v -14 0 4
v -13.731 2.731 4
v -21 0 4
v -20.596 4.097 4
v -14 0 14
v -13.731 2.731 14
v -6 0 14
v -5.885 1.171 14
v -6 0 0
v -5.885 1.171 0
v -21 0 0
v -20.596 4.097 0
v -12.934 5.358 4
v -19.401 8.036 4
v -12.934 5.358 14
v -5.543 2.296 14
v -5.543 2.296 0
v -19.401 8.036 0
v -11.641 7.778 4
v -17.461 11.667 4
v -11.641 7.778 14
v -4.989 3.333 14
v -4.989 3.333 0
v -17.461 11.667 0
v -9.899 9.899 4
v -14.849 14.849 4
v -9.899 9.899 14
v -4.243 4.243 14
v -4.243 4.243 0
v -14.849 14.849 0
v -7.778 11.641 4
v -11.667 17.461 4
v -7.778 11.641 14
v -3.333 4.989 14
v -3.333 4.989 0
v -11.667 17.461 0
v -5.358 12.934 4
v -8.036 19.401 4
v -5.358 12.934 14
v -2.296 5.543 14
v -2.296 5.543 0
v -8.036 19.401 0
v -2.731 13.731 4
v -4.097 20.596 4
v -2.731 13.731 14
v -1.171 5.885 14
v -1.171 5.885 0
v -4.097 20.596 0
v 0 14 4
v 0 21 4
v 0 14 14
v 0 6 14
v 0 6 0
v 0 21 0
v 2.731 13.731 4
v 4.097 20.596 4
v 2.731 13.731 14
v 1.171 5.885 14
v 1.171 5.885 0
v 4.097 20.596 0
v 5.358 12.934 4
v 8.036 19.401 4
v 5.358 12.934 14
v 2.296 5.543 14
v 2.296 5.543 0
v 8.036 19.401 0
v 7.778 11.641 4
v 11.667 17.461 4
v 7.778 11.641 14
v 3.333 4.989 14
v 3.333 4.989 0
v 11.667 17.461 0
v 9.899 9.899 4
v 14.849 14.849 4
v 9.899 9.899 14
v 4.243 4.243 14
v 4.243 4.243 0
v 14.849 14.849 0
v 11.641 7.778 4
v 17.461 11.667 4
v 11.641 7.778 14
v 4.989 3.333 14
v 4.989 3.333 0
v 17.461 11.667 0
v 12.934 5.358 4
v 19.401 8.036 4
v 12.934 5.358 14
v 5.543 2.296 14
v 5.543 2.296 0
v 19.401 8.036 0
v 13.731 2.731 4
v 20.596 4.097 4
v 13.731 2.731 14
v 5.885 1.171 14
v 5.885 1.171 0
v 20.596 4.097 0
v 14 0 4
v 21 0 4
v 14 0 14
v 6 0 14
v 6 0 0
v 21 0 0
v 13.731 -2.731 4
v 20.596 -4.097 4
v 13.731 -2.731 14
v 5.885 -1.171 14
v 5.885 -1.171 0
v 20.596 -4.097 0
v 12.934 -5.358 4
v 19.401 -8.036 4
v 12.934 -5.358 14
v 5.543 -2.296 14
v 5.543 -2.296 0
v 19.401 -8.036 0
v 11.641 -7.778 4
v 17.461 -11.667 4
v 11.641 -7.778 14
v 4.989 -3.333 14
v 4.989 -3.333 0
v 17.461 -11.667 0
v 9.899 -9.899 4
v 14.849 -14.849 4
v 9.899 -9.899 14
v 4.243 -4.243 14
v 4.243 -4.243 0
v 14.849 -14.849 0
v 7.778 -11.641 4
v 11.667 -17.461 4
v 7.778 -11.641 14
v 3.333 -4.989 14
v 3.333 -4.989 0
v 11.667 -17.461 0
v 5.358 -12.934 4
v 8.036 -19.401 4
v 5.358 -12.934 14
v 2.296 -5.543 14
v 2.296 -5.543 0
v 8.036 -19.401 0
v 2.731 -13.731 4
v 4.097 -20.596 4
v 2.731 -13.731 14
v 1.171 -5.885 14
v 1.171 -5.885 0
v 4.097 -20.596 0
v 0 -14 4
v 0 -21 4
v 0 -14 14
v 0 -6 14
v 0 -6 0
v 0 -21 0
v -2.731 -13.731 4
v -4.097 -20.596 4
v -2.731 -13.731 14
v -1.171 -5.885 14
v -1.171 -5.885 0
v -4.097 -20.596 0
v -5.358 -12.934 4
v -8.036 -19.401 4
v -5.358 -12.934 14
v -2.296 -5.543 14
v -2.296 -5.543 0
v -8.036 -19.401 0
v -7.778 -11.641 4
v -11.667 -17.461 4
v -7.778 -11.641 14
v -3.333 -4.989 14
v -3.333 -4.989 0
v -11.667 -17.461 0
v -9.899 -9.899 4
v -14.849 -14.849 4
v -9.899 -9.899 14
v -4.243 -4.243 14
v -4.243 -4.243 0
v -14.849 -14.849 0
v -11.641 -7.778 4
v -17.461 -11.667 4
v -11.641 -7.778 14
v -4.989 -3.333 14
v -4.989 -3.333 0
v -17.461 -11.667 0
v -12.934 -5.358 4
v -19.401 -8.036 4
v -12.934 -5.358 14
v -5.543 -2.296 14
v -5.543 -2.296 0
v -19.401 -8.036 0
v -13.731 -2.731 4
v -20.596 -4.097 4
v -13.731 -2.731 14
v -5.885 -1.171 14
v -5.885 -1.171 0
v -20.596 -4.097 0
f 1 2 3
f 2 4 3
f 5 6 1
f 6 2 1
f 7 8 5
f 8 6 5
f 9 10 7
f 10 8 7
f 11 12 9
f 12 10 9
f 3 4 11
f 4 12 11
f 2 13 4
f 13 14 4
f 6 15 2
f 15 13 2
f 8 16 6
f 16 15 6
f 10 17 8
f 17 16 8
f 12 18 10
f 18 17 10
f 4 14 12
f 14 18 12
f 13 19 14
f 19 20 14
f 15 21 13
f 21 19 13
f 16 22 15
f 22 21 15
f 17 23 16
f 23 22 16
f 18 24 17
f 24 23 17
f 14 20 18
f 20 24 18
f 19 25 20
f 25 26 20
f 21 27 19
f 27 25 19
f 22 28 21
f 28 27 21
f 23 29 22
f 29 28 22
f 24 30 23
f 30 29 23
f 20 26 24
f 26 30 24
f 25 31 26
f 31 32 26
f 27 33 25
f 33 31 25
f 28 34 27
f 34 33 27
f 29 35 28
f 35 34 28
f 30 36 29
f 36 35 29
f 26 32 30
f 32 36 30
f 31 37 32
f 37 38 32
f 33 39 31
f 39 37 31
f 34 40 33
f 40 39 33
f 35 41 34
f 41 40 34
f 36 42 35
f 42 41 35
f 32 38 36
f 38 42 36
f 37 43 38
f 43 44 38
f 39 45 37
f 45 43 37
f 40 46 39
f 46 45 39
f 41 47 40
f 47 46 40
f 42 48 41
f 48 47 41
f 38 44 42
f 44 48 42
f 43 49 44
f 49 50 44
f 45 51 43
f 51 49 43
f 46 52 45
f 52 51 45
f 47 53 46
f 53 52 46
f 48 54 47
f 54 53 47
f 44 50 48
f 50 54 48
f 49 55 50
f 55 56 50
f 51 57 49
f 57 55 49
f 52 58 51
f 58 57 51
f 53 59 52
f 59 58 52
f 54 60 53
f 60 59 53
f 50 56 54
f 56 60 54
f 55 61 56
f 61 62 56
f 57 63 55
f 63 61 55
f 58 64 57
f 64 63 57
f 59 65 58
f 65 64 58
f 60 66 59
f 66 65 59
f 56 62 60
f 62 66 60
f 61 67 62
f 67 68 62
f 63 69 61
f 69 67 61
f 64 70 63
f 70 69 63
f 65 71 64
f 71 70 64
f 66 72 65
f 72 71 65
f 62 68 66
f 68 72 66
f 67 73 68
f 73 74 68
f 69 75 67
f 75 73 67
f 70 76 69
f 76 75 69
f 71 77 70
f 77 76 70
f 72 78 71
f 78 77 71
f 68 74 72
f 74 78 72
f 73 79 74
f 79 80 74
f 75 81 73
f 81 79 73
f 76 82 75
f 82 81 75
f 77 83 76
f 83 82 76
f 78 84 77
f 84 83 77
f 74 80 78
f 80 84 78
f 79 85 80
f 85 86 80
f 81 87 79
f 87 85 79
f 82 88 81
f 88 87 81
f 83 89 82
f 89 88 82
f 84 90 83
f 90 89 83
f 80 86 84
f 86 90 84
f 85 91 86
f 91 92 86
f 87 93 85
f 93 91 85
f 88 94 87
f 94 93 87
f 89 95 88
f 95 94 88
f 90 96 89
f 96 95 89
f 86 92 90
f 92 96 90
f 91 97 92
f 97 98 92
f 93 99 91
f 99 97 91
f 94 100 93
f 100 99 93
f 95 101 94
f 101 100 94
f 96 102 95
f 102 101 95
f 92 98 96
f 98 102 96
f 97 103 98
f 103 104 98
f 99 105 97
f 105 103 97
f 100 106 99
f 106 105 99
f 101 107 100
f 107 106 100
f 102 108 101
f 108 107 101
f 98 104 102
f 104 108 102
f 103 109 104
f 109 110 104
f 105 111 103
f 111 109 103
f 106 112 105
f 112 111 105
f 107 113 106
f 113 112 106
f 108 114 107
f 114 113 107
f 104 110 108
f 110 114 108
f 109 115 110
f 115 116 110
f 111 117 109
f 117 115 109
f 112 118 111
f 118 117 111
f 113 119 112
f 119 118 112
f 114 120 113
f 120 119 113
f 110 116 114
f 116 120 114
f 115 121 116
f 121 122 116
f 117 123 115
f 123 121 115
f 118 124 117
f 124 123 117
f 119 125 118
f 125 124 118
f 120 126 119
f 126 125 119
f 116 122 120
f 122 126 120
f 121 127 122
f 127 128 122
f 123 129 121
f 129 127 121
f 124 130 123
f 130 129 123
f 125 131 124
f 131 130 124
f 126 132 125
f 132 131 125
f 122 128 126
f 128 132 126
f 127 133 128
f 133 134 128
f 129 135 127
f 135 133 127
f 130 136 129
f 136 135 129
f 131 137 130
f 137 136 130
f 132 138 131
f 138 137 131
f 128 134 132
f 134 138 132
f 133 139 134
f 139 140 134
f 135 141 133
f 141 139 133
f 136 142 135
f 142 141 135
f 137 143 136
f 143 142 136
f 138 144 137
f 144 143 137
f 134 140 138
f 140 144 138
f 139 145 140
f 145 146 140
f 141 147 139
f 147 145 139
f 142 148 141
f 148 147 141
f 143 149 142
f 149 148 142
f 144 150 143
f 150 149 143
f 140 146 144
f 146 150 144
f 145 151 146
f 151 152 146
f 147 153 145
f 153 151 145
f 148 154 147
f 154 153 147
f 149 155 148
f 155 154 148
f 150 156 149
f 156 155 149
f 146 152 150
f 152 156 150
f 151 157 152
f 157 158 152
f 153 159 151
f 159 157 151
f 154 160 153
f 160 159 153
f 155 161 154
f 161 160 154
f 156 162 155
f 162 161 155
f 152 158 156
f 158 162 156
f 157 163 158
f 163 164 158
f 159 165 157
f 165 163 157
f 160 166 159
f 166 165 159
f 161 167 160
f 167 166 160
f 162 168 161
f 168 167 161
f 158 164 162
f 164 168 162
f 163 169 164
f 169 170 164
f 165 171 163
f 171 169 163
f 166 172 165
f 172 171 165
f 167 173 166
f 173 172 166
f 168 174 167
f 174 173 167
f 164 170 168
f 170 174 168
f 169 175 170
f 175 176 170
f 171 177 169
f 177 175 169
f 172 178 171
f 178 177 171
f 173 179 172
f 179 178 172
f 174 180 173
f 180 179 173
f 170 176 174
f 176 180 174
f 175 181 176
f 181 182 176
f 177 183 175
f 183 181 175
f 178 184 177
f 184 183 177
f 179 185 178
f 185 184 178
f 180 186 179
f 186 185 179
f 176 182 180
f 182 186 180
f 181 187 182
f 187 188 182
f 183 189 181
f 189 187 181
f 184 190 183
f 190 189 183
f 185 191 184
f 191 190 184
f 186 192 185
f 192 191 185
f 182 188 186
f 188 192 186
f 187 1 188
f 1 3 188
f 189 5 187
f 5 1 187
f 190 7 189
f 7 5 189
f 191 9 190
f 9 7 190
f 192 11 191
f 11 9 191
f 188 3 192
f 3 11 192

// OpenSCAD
$fn = 32;

// ----------------------------------------------------------------------
// Arc stop: collar, 14 mm thick
// ----------------------------------------------------------------------

// --- parameters (mm) ---
revolve_angle = 360;      // full turn around the Z axis
profile_points = 6;       // points of the closed outline

profile = [[6, 0], [21, 0], [21, 4], [14, 4], [14, 14], [6, 14]];  // single closed polygon, 6 points, counter clockwise

// --- the one profile operation ---
rotate_extrude(angle = revolve_angle) polygon(points = profile);
